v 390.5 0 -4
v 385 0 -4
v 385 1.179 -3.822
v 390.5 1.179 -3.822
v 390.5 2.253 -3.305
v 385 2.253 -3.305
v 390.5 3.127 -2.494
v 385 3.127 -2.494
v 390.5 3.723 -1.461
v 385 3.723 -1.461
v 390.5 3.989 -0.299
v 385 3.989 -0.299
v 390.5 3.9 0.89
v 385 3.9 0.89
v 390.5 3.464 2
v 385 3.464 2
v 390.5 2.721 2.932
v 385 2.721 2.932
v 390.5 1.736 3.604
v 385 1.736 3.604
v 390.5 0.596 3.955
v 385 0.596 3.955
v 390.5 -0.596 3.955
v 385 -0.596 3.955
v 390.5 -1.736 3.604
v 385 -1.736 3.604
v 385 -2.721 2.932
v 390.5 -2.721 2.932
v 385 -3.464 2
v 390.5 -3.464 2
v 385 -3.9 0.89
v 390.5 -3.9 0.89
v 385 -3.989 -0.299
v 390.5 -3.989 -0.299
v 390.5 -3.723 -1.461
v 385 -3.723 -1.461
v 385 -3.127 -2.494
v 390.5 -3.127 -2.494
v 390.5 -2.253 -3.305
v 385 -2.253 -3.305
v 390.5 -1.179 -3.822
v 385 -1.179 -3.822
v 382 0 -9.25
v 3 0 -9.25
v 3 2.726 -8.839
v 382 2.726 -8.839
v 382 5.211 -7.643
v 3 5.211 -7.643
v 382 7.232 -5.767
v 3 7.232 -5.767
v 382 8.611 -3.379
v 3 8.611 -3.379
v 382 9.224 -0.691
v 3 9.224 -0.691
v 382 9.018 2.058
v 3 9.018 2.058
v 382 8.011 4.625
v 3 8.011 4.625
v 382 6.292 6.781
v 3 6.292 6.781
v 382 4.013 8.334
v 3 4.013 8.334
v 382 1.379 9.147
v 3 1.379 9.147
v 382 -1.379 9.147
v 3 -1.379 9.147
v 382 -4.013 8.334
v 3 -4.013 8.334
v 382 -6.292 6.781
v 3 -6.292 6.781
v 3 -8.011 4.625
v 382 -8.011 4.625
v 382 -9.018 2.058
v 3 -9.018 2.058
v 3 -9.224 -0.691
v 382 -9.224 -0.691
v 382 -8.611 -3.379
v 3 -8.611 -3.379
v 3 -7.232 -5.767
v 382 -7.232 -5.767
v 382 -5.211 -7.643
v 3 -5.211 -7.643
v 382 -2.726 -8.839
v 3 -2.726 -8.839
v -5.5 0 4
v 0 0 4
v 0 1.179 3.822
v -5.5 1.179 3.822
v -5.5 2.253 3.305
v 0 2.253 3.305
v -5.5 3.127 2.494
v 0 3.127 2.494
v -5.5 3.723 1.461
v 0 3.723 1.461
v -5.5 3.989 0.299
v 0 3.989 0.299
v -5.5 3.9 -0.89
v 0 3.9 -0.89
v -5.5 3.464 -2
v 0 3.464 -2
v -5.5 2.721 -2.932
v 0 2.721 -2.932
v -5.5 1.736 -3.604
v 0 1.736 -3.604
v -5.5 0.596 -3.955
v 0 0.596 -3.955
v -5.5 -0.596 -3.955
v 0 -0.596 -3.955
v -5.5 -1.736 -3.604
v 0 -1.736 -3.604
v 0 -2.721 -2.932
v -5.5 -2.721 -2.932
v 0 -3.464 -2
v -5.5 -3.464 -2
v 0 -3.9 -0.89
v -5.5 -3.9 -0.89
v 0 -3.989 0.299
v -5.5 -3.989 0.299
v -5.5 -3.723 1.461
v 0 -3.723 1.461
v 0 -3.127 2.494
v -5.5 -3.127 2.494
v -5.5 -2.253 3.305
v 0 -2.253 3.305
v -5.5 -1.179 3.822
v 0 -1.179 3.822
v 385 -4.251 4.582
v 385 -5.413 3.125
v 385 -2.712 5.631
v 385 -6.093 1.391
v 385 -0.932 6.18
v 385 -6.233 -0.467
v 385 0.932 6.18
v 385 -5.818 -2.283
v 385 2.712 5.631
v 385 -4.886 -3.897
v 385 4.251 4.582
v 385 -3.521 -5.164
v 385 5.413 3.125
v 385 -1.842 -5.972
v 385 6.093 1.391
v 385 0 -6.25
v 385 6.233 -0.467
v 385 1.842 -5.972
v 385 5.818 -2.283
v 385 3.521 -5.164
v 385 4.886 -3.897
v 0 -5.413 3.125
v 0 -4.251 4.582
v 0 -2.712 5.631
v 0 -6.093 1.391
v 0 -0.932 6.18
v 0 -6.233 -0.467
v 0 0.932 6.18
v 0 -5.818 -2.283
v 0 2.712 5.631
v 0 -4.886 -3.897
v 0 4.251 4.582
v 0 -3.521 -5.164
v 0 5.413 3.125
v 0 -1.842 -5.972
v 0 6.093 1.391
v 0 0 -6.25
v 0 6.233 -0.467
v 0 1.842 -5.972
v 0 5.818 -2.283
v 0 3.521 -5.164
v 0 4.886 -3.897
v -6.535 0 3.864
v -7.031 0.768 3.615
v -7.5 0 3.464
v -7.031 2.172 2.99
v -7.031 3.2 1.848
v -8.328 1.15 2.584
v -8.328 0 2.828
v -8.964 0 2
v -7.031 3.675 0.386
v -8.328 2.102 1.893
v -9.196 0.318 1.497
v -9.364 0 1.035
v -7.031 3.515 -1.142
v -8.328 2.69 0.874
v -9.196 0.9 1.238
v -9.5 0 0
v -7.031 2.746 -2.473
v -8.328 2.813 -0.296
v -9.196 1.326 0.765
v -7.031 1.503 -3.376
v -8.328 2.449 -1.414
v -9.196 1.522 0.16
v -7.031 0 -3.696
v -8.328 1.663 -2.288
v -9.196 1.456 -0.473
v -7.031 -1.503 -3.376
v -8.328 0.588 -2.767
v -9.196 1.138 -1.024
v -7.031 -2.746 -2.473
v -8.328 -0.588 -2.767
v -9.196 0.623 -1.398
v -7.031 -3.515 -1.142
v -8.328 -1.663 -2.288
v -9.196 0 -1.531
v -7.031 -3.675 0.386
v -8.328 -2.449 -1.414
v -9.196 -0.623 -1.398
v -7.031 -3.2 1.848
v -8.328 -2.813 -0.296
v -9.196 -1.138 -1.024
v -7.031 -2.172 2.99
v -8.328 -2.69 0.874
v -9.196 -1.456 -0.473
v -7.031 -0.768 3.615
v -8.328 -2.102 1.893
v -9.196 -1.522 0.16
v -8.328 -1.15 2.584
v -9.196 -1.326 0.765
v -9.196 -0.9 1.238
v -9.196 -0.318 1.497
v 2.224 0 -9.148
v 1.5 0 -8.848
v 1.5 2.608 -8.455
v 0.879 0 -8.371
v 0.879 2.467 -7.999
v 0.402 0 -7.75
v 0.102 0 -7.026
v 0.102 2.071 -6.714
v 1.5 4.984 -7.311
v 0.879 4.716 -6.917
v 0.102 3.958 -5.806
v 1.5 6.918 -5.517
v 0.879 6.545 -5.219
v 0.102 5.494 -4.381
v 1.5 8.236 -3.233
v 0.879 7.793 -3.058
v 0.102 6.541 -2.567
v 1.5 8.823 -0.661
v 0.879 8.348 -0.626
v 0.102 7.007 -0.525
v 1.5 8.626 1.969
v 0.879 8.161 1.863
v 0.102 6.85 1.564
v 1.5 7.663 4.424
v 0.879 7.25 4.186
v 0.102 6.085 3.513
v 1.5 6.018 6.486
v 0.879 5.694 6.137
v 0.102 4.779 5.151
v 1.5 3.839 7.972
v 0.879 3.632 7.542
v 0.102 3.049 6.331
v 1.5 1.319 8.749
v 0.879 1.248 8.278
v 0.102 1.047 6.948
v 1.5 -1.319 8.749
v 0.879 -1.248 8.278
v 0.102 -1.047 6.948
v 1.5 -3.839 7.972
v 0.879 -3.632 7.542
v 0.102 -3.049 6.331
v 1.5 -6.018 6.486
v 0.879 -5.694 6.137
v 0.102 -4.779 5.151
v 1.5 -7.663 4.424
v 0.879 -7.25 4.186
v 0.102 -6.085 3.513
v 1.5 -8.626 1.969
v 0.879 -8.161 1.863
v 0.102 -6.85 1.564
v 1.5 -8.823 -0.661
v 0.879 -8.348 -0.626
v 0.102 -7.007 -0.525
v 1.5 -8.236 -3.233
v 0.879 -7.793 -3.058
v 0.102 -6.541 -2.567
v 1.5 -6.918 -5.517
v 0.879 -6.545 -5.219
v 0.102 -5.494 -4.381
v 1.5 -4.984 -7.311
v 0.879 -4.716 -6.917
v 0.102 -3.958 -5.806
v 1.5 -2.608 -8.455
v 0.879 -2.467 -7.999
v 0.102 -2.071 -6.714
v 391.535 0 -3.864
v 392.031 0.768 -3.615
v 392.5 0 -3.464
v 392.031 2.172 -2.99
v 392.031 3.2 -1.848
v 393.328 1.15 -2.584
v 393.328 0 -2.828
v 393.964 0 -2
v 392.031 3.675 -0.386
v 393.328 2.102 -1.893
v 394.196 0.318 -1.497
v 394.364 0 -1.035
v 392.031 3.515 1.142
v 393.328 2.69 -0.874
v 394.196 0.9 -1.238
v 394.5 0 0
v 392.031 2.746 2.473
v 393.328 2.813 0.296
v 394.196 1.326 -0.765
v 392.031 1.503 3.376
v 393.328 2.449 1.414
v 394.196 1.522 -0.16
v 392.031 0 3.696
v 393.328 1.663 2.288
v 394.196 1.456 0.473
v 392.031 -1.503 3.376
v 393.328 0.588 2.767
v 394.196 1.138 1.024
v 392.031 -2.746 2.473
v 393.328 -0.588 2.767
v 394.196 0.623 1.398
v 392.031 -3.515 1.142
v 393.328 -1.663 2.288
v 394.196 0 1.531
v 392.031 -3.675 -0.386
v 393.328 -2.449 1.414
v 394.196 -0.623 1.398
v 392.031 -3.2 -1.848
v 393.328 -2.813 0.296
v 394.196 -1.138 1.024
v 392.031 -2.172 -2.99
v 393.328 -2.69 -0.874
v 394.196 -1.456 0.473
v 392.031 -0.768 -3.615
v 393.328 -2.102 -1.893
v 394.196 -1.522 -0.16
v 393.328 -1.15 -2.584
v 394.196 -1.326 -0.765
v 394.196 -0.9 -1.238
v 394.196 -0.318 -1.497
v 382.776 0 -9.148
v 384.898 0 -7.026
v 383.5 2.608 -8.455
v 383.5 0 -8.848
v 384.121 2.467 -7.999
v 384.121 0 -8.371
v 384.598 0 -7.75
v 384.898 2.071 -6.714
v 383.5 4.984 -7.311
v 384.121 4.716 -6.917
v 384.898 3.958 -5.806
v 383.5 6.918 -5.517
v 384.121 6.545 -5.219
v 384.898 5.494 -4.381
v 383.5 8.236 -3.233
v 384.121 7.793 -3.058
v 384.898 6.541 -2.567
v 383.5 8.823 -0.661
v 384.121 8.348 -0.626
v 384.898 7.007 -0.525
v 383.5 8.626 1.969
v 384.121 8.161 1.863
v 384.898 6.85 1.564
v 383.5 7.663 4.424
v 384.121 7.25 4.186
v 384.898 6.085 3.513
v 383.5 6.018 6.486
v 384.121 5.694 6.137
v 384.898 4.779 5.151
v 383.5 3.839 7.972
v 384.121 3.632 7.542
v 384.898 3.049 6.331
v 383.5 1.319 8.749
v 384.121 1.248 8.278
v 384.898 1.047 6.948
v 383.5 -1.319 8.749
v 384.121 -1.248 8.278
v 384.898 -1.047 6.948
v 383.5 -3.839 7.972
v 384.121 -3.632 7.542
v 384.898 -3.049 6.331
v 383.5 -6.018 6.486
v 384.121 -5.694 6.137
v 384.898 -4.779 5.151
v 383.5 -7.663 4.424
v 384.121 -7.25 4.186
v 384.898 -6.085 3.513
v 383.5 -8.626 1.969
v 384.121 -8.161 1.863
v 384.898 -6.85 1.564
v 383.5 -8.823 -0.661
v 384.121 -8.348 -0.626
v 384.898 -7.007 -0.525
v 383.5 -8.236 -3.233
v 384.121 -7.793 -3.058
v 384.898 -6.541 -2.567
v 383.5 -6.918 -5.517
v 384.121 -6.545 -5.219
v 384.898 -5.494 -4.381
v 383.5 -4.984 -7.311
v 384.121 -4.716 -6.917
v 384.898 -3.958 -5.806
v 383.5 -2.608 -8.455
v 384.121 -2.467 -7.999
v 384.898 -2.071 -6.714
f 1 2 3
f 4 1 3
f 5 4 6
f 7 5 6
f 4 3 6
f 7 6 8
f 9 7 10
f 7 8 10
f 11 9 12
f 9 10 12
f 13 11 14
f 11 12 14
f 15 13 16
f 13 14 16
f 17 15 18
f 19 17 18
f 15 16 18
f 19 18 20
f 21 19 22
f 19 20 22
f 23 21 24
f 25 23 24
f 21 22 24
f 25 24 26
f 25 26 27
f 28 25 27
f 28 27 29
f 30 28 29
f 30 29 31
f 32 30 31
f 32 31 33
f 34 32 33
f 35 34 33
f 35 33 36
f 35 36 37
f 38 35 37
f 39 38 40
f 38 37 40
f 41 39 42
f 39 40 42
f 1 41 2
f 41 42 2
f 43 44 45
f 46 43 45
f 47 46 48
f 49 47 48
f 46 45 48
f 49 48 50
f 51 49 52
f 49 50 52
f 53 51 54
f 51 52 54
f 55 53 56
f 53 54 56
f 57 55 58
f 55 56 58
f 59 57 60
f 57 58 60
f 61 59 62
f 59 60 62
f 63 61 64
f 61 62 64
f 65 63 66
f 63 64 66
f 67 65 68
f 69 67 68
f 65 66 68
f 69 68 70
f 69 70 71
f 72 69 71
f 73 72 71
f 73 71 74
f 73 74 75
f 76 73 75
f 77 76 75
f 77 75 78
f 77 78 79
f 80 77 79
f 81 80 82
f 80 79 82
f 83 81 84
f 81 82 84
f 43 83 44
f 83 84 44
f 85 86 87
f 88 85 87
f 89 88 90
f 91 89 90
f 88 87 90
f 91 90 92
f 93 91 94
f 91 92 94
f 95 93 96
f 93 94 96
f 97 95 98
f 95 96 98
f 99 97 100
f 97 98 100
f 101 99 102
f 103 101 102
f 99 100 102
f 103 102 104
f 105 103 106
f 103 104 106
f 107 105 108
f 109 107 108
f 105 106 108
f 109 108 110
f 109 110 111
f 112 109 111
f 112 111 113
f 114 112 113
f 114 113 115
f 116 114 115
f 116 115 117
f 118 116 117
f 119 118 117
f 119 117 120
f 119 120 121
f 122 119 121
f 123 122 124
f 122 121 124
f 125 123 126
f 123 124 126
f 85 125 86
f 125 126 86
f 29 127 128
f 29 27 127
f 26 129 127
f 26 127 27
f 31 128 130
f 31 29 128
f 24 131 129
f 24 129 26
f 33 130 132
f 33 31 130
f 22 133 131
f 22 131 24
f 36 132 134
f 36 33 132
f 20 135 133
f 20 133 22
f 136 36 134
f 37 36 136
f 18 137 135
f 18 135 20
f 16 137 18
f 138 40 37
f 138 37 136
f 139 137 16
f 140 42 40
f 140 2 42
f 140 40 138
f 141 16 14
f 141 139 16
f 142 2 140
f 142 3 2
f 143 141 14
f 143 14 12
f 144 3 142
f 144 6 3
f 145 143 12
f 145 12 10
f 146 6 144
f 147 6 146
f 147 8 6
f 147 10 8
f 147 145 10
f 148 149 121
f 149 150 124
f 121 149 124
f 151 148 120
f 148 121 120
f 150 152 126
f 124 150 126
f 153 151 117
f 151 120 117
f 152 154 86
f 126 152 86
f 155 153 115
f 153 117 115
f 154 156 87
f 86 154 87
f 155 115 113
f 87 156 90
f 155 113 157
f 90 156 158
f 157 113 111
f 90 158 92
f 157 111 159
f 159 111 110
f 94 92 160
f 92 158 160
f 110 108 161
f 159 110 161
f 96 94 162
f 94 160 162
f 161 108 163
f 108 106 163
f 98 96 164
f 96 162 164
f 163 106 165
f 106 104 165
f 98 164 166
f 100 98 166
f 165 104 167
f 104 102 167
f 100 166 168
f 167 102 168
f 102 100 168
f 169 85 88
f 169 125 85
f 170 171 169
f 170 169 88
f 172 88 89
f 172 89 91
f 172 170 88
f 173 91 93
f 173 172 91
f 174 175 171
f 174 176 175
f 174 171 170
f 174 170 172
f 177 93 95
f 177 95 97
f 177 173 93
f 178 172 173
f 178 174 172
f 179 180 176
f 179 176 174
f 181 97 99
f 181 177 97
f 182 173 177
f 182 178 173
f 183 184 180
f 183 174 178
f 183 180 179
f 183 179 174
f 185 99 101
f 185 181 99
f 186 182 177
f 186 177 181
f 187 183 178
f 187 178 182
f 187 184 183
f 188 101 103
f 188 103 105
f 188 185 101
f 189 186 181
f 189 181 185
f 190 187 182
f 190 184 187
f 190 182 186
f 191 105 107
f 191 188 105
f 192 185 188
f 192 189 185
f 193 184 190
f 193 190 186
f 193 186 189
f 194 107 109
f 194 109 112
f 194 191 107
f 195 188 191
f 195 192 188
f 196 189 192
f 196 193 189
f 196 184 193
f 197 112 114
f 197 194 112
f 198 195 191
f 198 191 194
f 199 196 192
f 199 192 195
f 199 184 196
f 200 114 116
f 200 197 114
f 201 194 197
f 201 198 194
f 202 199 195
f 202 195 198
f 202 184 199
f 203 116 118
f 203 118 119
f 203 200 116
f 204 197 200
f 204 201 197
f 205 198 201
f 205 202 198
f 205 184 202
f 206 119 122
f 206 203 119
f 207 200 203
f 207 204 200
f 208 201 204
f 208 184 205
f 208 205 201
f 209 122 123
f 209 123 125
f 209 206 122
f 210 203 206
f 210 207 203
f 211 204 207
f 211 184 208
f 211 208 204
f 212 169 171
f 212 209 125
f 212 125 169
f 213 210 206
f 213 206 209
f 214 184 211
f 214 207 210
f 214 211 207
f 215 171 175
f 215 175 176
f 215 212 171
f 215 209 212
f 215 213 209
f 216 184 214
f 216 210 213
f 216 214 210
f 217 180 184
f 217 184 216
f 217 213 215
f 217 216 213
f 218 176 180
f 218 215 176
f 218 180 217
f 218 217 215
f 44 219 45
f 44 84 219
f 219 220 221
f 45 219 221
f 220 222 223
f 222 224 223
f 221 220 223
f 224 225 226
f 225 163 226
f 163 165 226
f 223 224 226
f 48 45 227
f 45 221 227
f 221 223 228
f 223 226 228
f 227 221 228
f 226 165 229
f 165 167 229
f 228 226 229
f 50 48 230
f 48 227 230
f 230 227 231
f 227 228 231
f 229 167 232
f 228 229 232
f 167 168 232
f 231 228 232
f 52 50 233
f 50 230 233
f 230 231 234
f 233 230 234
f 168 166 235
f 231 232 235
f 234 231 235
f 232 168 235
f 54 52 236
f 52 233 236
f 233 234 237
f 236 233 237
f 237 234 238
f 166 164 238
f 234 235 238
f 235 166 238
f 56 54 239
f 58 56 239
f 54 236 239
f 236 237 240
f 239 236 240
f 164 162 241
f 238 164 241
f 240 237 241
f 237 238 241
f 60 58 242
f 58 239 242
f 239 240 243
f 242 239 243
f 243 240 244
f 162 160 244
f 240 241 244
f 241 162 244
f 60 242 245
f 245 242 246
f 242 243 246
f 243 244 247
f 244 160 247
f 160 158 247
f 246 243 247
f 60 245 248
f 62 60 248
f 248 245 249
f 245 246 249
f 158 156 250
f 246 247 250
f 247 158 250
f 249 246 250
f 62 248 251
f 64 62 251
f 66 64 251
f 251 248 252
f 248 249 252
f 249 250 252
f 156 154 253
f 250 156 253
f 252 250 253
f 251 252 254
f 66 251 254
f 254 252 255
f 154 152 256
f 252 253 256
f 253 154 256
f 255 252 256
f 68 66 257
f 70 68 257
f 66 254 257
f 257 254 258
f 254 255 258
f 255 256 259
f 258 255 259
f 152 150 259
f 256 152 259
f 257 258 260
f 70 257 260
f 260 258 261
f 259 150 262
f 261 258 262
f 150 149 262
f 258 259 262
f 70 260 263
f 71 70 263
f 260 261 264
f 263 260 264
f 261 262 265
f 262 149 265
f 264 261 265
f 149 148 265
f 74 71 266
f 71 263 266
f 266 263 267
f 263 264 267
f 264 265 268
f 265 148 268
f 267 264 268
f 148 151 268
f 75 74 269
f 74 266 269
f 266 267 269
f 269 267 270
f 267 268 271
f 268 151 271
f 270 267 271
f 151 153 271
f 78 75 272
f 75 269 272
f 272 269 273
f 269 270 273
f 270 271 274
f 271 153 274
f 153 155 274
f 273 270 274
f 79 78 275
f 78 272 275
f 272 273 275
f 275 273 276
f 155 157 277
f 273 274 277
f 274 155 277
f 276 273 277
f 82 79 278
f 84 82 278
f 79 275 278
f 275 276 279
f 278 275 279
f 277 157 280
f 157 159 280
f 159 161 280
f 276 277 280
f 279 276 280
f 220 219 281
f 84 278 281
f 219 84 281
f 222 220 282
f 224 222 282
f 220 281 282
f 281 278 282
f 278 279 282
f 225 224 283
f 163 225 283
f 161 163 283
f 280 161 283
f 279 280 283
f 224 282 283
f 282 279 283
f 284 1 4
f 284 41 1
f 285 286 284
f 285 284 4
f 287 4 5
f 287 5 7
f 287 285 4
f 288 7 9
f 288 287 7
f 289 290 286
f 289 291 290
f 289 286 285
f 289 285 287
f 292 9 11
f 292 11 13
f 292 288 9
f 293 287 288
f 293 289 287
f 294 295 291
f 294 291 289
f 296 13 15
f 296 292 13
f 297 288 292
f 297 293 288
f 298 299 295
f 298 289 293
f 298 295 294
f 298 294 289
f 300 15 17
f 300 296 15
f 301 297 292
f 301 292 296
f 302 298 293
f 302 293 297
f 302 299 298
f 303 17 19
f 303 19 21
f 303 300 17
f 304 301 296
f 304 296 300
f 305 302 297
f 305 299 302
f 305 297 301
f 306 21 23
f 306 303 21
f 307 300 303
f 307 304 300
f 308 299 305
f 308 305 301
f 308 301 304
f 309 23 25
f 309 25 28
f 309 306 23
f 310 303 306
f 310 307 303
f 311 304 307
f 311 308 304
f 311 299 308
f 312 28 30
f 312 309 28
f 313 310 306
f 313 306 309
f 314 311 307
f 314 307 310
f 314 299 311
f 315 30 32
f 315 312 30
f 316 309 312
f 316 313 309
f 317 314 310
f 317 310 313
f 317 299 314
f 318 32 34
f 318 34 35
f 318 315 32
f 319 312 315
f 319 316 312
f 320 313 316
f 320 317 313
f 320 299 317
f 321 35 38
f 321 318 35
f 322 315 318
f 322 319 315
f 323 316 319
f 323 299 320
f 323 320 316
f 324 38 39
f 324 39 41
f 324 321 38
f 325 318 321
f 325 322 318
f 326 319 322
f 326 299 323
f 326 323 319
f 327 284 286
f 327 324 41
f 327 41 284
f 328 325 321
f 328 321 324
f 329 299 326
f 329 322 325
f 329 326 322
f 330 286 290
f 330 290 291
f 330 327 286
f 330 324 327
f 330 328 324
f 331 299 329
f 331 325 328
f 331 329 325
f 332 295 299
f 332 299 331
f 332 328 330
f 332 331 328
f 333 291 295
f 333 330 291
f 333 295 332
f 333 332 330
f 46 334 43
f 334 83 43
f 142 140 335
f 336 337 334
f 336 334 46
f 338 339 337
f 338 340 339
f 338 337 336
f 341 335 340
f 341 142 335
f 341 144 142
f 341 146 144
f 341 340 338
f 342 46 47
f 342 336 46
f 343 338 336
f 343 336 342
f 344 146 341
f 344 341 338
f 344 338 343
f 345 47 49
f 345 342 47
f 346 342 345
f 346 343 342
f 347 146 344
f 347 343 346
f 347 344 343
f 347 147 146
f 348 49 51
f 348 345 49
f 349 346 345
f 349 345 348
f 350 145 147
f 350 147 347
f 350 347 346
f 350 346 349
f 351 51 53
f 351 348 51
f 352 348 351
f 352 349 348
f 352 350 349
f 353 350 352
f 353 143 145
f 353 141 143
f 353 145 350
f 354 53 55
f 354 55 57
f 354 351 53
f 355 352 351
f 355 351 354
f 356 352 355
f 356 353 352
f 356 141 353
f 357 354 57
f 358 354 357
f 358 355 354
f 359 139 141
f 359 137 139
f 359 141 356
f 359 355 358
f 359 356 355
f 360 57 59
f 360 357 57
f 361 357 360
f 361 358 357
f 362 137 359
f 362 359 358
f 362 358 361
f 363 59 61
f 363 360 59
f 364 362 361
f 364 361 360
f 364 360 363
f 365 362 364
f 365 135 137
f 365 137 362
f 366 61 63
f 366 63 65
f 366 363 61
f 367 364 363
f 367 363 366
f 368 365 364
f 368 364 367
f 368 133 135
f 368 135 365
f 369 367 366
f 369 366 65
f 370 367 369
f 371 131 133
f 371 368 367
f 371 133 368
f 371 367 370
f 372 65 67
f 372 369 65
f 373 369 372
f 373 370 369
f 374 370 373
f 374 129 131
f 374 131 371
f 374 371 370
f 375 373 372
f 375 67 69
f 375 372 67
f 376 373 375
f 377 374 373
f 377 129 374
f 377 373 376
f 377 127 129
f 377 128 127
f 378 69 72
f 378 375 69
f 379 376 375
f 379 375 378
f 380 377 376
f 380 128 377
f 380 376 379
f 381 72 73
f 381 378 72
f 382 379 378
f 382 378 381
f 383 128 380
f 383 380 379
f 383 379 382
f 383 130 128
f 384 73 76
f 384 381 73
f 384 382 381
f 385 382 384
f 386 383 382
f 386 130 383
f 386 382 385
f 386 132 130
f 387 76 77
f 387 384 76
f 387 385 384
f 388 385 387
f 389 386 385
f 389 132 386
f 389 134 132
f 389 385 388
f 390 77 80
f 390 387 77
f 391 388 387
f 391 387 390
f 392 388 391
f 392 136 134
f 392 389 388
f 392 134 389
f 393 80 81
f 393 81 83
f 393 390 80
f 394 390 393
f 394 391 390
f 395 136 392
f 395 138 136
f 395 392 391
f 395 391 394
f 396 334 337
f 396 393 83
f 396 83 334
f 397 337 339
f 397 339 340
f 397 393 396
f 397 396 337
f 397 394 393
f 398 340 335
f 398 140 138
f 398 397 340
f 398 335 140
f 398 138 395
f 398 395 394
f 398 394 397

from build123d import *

# Parameters (mm, degrees)
ESBO_O1_R                = 9.25
RESSALTO_EXTRUS_O1_DEPTH = 385
ESBO_O2_R                = 4
RESSALTO_EXTRUS_O2_DEPTH = 9.5
FILETE1_R                = 3
ESBO_O3_R                = 4
RESSALTO_EXTRUS_O3_DEPTH = 9.5
FILETE2_R                = 4


with BuildPart() as part:
    # Esboço1 → Ressalto-extrusão1 (new body)
    with BuildSketch(Plane(origin=(0, 0, 0), x_dir=(0, 0, -1), z_dir=(1, 0, 0))):
        Circle(ESBO_O1_R)
    extrude(amount=RESSALTO_EXTRUS_O1_DEPTH)

    # Esboço2 → Ressalto-extrusão2 (add)
    with BuildSketch(Plane.ZY):
        Circle(ESBO_O2_R)
    extrude(amount=RESSALTO_EXTRUS_O2_DEPTH)

    # Filete1
    filete1_edges = [part.edges().sort_by_distance(p)[0] for p in [
        (0, 0, 9.25),
        (385, 0, 9.25),
    ]]
    fillet(filete1_edges, radius=FILETE1_R)

    # Esboço3 → Ressalto-extrusão3 (add)
    with BuildSketch(Plane(origin=(385, 0, 0), x_dir=(0, 0, -1), z_dir=(1, 0, 0))):
        Circle(ESBO_O3_R)
    extrude(amount=RESSALTO_EXTRUS_O3_DEPTH)

    # Filete2
    filete2_edges = [part.edges().sort_by_distance(p)[0] for p in [
        (394.5, 0, 4),
        (-9.5, 0, -4),
    ]]
    fillet(filete2_edges, radius=FILETE2_R)


solid = part.part
